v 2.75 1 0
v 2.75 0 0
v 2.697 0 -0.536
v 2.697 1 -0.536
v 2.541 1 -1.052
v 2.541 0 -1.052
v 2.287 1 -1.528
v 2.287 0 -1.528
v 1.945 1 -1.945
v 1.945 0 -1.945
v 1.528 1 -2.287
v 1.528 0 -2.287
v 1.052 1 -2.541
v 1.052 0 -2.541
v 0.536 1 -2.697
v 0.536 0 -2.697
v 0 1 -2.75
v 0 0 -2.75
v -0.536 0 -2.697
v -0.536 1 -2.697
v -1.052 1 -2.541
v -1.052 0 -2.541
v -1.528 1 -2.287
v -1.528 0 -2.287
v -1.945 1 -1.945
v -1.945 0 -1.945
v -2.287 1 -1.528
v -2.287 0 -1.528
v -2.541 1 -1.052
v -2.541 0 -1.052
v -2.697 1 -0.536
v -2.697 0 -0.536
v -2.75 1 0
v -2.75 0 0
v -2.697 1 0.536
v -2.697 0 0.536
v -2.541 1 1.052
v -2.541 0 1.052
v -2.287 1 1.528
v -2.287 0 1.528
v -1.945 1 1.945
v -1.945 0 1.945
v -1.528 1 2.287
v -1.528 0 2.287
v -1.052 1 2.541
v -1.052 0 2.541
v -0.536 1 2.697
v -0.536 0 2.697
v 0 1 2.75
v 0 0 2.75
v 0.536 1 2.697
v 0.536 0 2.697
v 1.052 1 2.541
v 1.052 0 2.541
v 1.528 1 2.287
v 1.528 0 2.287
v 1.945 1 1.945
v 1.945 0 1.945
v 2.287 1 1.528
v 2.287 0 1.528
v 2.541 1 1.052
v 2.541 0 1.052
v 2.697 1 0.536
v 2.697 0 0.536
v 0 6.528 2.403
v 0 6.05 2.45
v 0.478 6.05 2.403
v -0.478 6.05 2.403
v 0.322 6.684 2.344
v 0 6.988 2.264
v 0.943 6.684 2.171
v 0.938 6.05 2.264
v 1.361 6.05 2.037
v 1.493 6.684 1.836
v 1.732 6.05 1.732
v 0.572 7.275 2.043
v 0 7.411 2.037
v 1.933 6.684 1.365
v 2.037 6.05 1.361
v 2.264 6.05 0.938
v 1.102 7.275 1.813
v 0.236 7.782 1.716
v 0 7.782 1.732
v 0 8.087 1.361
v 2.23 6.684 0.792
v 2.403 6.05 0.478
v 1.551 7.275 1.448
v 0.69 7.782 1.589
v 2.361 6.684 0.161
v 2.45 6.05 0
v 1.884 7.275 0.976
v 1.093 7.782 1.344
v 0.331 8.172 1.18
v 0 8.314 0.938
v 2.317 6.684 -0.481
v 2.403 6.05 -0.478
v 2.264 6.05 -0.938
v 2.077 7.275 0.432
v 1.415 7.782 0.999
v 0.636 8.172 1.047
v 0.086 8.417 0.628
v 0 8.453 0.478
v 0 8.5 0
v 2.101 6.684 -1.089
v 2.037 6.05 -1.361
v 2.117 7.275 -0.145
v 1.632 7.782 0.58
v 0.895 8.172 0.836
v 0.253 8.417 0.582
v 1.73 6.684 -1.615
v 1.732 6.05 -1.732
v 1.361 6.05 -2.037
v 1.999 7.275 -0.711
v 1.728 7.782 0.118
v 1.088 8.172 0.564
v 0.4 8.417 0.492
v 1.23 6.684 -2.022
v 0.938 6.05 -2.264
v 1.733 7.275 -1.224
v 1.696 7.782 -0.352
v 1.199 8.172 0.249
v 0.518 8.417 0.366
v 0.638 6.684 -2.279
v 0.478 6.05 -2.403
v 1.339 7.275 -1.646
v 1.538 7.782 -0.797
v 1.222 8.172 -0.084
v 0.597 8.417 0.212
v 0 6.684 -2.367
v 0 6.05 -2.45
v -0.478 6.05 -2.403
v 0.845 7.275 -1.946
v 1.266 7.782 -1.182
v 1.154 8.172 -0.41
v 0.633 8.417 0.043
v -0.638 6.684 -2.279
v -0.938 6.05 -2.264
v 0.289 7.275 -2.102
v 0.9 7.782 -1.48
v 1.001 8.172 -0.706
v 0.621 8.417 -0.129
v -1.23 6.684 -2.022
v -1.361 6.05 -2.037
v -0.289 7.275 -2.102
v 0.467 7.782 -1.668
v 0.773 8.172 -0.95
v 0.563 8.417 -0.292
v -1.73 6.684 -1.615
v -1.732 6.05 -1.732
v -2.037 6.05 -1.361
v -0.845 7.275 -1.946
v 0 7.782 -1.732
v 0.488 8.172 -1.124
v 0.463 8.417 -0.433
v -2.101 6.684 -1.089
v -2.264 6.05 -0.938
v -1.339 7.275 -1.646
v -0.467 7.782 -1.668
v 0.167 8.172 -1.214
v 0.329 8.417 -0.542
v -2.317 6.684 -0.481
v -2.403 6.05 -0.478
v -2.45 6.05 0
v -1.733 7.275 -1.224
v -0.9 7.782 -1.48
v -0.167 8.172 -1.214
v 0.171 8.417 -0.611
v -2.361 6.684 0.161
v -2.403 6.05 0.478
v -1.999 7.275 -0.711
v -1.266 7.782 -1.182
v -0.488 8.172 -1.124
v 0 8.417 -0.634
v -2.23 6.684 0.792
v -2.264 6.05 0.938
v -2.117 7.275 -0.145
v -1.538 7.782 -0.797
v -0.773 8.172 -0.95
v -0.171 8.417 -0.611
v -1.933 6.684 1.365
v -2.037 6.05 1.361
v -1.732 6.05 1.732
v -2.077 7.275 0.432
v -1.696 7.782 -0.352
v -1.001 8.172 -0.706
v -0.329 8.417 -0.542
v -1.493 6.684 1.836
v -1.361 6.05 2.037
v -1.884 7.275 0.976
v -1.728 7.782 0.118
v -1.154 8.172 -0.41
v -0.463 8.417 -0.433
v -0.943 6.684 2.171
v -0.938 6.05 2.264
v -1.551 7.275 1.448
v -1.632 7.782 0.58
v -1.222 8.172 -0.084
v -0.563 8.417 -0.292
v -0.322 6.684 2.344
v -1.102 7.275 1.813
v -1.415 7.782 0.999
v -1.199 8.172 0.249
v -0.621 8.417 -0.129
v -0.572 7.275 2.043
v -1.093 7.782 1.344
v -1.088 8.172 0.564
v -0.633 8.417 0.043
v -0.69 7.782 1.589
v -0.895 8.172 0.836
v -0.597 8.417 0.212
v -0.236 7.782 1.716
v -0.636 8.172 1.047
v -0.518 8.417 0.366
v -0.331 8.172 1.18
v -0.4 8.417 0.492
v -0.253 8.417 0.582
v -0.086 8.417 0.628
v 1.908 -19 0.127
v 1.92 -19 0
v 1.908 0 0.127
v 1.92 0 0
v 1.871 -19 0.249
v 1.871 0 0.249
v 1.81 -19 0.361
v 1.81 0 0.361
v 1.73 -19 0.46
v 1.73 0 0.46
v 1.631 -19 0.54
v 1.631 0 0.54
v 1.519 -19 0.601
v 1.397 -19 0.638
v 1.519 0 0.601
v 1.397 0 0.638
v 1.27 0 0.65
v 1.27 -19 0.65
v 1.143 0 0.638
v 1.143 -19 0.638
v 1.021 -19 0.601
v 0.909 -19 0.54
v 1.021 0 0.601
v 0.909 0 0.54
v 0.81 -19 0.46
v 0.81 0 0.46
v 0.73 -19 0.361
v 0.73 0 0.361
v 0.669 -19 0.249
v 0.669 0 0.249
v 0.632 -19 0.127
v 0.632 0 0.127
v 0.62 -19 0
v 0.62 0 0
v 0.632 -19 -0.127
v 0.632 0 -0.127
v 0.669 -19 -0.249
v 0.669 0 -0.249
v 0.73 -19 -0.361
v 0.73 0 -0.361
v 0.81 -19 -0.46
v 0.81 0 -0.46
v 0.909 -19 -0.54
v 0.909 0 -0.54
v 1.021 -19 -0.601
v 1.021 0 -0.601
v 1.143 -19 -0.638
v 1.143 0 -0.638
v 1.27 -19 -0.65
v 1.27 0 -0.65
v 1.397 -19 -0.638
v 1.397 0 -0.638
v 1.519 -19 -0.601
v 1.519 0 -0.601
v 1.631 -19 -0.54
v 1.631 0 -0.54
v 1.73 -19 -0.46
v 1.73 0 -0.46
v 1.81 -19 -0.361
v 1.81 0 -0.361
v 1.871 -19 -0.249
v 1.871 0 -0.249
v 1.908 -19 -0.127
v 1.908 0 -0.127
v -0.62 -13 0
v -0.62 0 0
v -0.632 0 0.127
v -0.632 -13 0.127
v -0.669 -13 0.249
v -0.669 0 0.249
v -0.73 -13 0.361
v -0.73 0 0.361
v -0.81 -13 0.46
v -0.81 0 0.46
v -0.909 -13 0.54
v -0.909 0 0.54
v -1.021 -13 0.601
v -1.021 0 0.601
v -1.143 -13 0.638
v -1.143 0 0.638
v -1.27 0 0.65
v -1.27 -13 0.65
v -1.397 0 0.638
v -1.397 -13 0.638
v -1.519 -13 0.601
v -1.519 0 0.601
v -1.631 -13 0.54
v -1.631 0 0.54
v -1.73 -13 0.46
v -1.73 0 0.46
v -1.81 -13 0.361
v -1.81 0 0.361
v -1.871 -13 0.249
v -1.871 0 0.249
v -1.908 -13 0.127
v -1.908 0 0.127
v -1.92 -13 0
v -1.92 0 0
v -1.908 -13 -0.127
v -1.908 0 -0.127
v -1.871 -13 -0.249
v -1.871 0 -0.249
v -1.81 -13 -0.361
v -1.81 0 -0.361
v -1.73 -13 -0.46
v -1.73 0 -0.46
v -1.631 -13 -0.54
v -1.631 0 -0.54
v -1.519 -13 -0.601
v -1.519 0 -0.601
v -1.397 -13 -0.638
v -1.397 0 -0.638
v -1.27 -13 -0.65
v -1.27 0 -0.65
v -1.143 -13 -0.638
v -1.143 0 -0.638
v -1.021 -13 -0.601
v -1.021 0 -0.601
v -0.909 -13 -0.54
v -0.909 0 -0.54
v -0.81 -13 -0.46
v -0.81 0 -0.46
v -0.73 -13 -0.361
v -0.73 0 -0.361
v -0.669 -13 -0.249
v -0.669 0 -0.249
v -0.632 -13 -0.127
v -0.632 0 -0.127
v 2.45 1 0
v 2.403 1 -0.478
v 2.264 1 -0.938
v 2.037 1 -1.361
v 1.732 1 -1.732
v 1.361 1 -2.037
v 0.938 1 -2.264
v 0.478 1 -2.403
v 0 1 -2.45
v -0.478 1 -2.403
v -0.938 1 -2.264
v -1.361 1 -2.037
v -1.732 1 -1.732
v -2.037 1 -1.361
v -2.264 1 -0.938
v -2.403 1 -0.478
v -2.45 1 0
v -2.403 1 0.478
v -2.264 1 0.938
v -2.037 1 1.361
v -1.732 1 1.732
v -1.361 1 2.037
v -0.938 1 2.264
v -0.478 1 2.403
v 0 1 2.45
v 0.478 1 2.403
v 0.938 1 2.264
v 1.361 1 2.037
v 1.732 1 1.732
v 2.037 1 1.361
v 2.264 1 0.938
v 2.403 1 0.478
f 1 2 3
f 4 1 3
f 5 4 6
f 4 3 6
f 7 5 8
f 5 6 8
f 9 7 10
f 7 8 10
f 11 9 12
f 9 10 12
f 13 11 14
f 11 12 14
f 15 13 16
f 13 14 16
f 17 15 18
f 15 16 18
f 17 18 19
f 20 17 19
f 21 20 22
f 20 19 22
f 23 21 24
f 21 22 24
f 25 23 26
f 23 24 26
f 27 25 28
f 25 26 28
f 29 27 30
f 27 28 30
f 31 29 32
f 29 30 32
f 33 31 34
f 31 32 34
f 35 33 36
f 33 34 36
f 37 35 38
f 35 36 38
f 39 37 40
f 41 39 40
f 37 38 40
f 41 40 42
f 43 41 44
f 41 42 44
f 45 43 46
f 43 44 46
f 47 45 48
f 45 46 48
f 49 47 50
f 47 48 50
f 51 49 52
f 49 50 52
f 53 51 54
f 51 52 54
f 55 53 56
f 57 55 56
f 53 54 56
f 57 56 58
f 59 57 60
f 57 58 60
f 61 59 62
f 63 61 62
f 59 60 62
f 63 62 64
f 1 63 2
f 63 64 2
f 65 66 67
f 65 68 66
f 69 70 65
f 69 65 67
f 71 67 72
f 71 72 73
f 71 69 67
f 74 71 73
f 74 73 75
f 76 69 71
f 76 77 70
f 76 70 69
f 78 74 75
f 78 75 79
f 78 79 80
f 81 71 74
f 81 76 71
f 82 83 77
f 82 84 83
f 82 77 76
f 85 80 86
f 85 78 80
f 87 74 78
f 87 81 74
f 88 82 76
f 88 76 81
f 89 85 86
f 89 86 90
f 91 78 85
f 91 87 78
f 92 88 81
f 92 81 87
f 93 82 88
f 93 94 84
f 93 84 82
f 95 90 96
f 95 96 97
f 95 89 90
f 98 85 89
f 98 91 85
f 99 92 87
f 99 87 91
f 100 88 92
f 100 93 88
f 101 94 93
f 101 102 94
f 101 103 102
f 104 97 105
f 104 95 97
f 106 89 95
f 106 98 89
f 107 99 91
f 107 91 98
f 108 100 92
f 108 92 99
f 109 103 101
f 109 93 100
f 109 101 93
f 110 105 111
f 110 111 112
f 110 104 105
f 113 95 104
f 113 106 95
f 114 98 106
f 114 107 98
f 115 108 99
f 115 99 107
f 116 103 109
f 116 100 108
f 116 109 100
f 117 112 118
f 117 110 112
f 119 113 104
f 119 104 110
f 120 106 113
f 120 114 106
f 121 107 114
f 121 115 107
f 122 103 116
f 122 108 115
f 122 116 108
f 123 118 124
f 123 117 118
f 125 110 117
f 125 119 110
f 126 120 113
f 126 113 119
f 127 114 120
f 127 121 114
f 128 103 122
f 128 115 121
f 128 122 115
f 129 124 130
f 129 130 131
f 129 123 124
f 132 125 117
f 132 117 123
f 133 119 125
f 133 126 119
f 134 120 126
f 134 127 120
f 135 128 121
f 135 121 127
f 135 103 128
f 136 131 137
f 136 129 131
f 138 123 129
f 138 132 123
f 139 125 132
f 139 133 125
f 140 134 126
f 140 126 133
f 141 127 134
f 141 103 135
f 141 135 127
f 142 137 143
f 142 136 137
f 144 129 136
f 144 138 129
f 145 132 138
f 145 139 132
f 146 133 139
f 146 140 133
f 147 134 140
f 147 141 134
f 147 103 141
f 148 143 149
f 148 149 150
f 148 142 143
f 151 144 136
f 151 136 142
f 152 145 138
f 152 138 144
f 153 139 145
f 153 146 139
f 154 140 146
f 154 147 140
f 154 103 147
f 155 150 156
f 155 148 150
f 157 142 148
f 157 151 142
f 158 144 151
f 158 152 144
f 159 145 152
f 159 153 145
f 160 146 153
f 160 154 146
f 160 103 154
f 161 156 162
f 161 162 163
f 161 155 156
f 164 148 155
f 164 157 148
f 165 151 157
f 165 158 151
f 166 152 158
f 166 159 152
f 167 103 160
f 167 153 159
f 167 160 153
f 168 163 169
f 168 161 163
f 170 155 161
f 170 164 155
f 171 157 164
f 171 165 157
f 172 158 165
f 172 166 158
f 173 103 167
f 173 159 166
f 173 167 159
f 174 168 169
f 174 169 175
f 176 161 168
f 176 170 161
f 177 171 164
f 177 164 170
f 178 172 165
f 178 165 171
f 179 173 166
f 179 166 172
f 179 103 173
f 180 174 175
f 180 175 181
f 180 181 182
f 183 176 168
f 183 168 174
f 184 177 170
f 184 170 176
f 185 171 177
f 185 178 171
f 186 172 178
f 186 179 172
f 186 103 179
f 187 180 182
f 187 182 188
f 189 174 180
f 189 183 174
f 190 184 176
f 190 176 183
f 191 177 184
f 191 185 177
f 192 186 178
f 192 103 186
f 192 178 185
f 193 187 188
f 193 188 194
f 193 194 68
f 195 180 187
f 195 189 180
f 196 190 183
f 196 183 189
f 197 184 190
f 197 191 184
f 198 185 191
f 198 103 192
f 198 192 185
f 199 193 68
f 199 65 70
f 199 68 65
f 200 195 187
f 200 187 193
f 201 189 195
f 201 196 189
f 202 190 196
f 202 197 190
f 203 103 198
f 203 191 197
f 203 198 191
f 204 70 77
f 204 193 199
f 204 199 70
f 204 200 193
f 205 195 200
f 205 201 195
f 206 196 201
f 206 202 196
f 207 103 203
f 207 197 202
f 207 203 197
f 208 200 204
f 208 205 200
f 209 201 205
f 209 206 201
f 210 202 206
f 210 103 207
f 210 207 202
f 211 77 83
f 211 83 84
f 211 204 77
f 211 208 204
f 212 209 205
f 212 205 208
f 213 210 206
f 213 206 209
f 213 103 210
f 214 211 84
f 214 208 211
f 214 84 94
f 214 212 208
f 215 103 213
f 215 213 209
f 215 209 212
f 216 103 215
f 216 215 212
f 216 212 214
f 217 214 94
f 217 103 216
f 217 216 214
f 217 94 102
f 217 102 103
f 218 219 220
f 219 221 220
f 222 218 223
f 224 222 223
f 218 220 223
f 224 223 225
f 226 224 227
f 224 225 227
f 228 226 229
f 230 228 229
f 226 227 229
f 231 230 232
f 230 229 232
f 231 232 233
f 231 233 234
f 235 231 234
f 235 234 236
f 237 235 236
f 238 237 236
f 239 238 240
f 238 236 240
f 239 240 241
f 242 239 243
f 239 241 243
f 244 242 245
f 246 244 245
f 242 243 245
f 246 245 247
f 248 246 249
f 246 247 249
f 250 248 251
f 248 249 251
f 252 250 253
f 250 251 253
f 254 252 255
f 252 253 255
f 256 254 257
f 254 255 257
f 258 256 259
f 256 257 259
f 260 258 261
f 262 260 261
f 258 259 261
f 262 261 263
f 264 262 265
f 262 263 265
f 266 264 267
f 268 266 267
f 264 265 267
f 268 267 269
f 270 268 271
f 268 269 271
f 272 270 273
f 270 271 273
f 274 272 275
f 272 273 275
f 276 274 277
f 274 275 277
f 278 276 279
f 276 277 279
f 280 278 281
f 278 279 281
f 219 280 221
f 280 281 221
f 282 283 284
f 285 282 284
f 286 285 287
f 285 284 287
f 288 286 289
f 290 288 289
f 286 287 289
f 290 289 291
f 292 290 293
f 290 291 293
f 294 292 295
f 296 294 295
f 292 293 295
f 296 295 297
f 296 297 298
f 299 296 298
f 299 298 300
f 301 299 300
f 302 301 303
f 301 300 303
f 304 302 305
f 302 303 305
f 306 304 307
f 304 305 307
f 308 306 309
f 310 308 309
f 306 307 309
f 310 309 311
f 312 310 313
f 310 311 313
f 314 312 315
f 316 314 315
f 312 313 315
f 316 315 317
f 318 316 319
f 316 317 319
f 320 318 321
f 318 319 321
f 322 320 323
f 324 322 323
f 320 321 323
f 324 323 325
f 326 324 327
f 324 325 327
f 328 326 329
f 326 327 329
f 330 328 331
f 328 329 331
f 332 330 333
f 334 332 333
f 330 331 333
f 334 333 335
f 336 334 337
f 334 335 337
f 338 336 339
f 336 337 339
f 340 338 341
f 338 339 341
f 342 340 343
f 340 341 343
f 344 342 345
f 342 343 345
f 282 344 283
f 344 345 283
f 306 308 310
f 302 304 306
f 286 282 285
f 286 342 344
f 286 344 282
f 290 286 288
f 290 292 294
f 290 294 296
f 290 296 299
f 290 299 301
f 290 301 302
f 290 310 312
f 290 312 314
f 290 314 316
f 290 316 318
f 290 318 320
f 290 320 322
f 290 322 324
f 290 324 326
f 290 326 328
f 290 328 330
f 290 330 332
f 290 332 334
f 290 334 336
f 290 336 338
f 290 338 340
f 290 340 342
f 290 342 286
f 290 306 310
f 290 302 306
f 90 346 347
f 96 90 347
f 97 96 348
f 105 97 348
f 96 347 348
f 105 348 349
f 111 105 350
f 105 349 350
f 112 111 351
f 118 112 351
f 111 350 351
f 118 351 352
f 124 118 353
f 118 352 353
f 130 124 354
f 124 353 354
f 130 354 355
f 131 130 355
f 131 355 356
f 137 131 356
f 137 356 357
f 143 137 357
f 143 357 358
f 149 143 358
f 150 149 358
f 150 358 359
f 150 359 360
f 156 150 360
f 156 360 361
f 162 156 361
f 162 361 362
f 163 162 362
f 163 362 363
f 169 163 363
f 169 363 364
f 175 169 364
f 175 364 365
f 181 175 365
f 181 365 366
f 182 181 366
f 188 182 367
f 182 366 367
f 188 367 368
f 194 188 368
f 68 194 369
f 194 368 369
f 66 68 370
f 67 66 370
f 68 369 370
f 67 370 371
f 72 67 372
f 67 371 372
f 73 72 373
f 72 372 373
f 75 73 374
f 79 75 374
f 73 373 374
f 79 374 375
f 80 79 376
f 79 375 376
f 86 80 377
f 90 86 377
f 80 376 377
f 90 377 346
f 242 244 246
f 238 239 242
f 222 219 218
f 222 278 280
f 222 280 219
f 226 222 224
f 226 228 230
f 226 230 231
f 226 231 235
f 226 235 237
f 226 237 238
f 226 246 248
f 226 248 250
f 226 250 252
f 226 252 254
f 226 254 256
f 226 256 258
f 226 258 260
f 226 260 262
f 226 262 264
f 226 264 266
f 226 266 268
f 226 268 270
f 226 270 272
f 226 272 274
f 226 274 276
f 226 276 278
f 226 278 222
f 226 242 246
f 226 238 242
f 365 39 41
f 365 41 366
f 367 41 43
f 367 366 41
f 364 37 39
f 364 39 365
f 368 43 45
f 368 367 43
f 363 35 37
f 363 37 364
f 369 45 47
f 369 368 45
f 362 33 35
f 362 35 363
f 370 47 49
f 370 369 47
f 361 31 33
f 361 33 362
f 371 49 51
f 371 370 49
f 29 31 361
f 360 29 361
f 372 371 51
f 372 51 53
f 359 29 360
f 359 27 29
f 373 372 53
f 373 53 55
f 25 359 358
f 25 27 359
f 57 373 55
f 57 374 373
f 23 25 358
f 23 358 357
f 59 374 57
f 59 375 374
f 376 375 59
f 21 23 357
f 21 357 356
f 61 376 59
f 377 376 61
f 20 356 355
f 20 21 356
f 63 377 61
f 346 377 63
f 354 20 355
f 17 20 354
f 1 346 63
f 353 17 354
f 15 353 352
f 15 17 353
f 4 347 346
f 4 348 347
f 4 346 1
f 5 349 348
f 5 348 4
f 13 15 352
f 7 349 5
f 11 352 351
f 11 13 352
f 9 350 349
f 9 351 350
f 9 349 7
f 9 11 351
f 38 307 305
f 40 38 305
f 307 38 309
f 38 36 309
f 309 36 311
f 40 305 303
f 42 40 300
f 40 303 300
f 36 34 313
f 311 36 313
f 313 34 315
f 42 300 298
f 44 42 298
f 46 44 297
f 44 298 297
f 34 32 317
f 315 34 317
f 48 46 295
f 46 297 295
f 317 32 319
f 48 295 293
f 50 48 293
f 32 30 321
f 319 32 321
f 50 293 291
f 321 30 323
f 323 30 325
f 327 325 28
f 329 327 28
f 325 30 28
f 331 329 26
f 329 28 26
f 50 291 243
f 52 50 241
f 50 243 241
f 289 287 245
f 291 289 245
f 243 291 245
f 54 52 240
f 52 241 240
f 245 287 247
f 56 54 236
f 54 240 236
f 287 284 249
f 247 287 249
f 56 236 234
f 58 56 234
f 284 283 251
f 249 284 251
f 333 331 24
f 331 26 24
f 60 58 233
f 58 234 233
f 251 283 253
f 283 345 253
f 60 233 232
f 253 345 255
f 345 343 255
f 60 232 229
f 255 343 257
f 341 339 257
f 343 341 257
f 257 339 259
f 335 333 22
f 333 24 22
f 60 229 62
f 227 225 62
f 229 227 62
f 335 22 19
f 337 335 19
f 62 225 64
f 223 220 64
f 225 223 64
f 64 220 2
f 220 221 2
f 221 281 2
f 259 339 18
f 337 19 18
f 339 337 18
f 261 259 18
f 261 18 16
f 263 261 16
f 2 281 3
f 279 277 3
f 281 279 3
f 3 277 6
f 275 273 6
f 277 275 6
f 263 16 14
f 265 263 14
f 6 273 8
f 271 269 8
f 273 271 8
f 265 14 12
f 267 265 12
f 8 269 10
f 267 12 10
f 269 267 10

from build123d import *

# Parameters (mm, degrees)
CROQUIS1_R              = 2.75
SALIENTE_EXTRUIR1_DEPTH = 1
CROQUIS2_R              = 2.45
SALIENTE_EXTRUIR2_DEPTH = 5.05
C_PULA1_FACE_RADIUS     = 2.45
C_PULA1_HEIGHT          = 2.45
CROQUIS3_R              = 0.25
SALIENTE_EXTRUIR3_DEPTH = 16
CROQUIS5_R              = 0.25
SALIENTE_EXTRUIR5_DEPTH = 17
SKETCH2_R               = 0.25
CUT_EXTRUDE1_DEPTH      = 16
SKETCH3_R               = 0.25
CUT_EXTRUDE2_DEPTH      = 10
SKETCH4_R               = 0.65
BOSS_EXTRUDE1_DEPTH     = 13
SKETCH5_R               = 0.65
BOSS_EXTRUDE2_DEPTH     = 6


with BuildPart() as part:
    # Croquis1 → Saliente-Extruir1 (new body)
    with BuildSketch(Plane(origin=(0, 0, 0), x_dir=(1, 0, 0), z_dir=(0, 1, 0))):
        Circle(CROQUIS1_R)
    extrude(amount=SALIENTE_EXTRUIR1_DEPTH)

    # Croquis2 → Saliente-Extruir2 (add)
    with BuildSketch(Plane(origin=(0, 1, 0), x_dir=(1, 0, 0), z_dir=(0, 1, 0))):
        Circle(CROQUIS2_R)
    extrude(amount=SALIENTE_EXTRUIR2_DEPTH)

    # Cúpula1: a dome of height H over a round flat face of radius A is a cap of a sphere of radius (A * A + H * H) / (2 * H)
    c_pula1_r = (C_PULA1_FACE_RADIUS * C_PULA1_FACE_RADIUS + C_PULA1_HEIGHT * C_PULA1_HEIGHT) / (2 * C_PULA1_HEIGHT)
    c_pula1_base = Plane((0, 6.05, 0), z_dir=(0, 1, 0))
    with Locations(c_pula1_base.offset(C_PULA1_HEIGHT - c_pula1_r)):
        c_pula1_ball = Sphere(c_pula1_r, mode=Mode.PRIVATE)
    add(split(c_pula1_ball, bisect_by=c_pula1_base, keep=Keep.TOP, mode=Mode.PRIVATE))

    # Croquis3 → Saliente-Extruir3 (add)
    with BuildSketch(Plane.XZ):
        with Locations((-1.205162028, 0)):
            Circle(CROQUIS3_R)
    extrude(amount=SALIENTE_EXTRUIR3_DEPTH)

    # Croquis5 → Saliente-Extruir5 (add)
    with BuildSketch(Plane.XZ):
        with Locations((1.205162028, 0)):
            Circle(CROQUIS5_R)
    extrude(amount=SALIENTE_EXTRUIR5_DEPTH)

    # Sketch2 → Cut-Extrude1 (cut)
    with BuildSketch(Plane.XZ.offset(16)):
        with Locations((-1.205162028, 0)):
            Circle(SKETCH2_R)
        with Locations((1.205162028, 0)):
            Circle(SKETCH2_R)
    extrude(amount=-CUT_EXTRUDE1_DEPTH, mode=Mode.SUBTRACT)

    # Sketch3 → Cut-Extrude2 (cut)
    with BuildSketch(Plane.XZ.offset(17)):
        with Locations((1.205162028, 0)):
            Circle(SKETCH3_R)
    extrude(amount=-CUT_EXTRUDE2_DEPTH, mode=Mode.SUBTRACT)

    # Sketch4 → Boss-Extrude1 (add)
    with BuildSketch(Plane.XZ):
        with Locations((1.27, 0)):
            Circle(SKETCH4_R)
        with Locations((-1.27, 0)):
            Circle(SKETCH4_R)
    extrude(amount=BOSS_EXTRUDE1_DEPTH)

    # Sketch5 → Boss-Extrude2 (add)
    with BuildSketch(Plane.XZ.offset(13)):
        with Locations((1.27, 0)):
            Circle(SKETCH5_R)
    extrude(amount=BOSS_EXTRUDE2_DEPTH)


solid = part.part
